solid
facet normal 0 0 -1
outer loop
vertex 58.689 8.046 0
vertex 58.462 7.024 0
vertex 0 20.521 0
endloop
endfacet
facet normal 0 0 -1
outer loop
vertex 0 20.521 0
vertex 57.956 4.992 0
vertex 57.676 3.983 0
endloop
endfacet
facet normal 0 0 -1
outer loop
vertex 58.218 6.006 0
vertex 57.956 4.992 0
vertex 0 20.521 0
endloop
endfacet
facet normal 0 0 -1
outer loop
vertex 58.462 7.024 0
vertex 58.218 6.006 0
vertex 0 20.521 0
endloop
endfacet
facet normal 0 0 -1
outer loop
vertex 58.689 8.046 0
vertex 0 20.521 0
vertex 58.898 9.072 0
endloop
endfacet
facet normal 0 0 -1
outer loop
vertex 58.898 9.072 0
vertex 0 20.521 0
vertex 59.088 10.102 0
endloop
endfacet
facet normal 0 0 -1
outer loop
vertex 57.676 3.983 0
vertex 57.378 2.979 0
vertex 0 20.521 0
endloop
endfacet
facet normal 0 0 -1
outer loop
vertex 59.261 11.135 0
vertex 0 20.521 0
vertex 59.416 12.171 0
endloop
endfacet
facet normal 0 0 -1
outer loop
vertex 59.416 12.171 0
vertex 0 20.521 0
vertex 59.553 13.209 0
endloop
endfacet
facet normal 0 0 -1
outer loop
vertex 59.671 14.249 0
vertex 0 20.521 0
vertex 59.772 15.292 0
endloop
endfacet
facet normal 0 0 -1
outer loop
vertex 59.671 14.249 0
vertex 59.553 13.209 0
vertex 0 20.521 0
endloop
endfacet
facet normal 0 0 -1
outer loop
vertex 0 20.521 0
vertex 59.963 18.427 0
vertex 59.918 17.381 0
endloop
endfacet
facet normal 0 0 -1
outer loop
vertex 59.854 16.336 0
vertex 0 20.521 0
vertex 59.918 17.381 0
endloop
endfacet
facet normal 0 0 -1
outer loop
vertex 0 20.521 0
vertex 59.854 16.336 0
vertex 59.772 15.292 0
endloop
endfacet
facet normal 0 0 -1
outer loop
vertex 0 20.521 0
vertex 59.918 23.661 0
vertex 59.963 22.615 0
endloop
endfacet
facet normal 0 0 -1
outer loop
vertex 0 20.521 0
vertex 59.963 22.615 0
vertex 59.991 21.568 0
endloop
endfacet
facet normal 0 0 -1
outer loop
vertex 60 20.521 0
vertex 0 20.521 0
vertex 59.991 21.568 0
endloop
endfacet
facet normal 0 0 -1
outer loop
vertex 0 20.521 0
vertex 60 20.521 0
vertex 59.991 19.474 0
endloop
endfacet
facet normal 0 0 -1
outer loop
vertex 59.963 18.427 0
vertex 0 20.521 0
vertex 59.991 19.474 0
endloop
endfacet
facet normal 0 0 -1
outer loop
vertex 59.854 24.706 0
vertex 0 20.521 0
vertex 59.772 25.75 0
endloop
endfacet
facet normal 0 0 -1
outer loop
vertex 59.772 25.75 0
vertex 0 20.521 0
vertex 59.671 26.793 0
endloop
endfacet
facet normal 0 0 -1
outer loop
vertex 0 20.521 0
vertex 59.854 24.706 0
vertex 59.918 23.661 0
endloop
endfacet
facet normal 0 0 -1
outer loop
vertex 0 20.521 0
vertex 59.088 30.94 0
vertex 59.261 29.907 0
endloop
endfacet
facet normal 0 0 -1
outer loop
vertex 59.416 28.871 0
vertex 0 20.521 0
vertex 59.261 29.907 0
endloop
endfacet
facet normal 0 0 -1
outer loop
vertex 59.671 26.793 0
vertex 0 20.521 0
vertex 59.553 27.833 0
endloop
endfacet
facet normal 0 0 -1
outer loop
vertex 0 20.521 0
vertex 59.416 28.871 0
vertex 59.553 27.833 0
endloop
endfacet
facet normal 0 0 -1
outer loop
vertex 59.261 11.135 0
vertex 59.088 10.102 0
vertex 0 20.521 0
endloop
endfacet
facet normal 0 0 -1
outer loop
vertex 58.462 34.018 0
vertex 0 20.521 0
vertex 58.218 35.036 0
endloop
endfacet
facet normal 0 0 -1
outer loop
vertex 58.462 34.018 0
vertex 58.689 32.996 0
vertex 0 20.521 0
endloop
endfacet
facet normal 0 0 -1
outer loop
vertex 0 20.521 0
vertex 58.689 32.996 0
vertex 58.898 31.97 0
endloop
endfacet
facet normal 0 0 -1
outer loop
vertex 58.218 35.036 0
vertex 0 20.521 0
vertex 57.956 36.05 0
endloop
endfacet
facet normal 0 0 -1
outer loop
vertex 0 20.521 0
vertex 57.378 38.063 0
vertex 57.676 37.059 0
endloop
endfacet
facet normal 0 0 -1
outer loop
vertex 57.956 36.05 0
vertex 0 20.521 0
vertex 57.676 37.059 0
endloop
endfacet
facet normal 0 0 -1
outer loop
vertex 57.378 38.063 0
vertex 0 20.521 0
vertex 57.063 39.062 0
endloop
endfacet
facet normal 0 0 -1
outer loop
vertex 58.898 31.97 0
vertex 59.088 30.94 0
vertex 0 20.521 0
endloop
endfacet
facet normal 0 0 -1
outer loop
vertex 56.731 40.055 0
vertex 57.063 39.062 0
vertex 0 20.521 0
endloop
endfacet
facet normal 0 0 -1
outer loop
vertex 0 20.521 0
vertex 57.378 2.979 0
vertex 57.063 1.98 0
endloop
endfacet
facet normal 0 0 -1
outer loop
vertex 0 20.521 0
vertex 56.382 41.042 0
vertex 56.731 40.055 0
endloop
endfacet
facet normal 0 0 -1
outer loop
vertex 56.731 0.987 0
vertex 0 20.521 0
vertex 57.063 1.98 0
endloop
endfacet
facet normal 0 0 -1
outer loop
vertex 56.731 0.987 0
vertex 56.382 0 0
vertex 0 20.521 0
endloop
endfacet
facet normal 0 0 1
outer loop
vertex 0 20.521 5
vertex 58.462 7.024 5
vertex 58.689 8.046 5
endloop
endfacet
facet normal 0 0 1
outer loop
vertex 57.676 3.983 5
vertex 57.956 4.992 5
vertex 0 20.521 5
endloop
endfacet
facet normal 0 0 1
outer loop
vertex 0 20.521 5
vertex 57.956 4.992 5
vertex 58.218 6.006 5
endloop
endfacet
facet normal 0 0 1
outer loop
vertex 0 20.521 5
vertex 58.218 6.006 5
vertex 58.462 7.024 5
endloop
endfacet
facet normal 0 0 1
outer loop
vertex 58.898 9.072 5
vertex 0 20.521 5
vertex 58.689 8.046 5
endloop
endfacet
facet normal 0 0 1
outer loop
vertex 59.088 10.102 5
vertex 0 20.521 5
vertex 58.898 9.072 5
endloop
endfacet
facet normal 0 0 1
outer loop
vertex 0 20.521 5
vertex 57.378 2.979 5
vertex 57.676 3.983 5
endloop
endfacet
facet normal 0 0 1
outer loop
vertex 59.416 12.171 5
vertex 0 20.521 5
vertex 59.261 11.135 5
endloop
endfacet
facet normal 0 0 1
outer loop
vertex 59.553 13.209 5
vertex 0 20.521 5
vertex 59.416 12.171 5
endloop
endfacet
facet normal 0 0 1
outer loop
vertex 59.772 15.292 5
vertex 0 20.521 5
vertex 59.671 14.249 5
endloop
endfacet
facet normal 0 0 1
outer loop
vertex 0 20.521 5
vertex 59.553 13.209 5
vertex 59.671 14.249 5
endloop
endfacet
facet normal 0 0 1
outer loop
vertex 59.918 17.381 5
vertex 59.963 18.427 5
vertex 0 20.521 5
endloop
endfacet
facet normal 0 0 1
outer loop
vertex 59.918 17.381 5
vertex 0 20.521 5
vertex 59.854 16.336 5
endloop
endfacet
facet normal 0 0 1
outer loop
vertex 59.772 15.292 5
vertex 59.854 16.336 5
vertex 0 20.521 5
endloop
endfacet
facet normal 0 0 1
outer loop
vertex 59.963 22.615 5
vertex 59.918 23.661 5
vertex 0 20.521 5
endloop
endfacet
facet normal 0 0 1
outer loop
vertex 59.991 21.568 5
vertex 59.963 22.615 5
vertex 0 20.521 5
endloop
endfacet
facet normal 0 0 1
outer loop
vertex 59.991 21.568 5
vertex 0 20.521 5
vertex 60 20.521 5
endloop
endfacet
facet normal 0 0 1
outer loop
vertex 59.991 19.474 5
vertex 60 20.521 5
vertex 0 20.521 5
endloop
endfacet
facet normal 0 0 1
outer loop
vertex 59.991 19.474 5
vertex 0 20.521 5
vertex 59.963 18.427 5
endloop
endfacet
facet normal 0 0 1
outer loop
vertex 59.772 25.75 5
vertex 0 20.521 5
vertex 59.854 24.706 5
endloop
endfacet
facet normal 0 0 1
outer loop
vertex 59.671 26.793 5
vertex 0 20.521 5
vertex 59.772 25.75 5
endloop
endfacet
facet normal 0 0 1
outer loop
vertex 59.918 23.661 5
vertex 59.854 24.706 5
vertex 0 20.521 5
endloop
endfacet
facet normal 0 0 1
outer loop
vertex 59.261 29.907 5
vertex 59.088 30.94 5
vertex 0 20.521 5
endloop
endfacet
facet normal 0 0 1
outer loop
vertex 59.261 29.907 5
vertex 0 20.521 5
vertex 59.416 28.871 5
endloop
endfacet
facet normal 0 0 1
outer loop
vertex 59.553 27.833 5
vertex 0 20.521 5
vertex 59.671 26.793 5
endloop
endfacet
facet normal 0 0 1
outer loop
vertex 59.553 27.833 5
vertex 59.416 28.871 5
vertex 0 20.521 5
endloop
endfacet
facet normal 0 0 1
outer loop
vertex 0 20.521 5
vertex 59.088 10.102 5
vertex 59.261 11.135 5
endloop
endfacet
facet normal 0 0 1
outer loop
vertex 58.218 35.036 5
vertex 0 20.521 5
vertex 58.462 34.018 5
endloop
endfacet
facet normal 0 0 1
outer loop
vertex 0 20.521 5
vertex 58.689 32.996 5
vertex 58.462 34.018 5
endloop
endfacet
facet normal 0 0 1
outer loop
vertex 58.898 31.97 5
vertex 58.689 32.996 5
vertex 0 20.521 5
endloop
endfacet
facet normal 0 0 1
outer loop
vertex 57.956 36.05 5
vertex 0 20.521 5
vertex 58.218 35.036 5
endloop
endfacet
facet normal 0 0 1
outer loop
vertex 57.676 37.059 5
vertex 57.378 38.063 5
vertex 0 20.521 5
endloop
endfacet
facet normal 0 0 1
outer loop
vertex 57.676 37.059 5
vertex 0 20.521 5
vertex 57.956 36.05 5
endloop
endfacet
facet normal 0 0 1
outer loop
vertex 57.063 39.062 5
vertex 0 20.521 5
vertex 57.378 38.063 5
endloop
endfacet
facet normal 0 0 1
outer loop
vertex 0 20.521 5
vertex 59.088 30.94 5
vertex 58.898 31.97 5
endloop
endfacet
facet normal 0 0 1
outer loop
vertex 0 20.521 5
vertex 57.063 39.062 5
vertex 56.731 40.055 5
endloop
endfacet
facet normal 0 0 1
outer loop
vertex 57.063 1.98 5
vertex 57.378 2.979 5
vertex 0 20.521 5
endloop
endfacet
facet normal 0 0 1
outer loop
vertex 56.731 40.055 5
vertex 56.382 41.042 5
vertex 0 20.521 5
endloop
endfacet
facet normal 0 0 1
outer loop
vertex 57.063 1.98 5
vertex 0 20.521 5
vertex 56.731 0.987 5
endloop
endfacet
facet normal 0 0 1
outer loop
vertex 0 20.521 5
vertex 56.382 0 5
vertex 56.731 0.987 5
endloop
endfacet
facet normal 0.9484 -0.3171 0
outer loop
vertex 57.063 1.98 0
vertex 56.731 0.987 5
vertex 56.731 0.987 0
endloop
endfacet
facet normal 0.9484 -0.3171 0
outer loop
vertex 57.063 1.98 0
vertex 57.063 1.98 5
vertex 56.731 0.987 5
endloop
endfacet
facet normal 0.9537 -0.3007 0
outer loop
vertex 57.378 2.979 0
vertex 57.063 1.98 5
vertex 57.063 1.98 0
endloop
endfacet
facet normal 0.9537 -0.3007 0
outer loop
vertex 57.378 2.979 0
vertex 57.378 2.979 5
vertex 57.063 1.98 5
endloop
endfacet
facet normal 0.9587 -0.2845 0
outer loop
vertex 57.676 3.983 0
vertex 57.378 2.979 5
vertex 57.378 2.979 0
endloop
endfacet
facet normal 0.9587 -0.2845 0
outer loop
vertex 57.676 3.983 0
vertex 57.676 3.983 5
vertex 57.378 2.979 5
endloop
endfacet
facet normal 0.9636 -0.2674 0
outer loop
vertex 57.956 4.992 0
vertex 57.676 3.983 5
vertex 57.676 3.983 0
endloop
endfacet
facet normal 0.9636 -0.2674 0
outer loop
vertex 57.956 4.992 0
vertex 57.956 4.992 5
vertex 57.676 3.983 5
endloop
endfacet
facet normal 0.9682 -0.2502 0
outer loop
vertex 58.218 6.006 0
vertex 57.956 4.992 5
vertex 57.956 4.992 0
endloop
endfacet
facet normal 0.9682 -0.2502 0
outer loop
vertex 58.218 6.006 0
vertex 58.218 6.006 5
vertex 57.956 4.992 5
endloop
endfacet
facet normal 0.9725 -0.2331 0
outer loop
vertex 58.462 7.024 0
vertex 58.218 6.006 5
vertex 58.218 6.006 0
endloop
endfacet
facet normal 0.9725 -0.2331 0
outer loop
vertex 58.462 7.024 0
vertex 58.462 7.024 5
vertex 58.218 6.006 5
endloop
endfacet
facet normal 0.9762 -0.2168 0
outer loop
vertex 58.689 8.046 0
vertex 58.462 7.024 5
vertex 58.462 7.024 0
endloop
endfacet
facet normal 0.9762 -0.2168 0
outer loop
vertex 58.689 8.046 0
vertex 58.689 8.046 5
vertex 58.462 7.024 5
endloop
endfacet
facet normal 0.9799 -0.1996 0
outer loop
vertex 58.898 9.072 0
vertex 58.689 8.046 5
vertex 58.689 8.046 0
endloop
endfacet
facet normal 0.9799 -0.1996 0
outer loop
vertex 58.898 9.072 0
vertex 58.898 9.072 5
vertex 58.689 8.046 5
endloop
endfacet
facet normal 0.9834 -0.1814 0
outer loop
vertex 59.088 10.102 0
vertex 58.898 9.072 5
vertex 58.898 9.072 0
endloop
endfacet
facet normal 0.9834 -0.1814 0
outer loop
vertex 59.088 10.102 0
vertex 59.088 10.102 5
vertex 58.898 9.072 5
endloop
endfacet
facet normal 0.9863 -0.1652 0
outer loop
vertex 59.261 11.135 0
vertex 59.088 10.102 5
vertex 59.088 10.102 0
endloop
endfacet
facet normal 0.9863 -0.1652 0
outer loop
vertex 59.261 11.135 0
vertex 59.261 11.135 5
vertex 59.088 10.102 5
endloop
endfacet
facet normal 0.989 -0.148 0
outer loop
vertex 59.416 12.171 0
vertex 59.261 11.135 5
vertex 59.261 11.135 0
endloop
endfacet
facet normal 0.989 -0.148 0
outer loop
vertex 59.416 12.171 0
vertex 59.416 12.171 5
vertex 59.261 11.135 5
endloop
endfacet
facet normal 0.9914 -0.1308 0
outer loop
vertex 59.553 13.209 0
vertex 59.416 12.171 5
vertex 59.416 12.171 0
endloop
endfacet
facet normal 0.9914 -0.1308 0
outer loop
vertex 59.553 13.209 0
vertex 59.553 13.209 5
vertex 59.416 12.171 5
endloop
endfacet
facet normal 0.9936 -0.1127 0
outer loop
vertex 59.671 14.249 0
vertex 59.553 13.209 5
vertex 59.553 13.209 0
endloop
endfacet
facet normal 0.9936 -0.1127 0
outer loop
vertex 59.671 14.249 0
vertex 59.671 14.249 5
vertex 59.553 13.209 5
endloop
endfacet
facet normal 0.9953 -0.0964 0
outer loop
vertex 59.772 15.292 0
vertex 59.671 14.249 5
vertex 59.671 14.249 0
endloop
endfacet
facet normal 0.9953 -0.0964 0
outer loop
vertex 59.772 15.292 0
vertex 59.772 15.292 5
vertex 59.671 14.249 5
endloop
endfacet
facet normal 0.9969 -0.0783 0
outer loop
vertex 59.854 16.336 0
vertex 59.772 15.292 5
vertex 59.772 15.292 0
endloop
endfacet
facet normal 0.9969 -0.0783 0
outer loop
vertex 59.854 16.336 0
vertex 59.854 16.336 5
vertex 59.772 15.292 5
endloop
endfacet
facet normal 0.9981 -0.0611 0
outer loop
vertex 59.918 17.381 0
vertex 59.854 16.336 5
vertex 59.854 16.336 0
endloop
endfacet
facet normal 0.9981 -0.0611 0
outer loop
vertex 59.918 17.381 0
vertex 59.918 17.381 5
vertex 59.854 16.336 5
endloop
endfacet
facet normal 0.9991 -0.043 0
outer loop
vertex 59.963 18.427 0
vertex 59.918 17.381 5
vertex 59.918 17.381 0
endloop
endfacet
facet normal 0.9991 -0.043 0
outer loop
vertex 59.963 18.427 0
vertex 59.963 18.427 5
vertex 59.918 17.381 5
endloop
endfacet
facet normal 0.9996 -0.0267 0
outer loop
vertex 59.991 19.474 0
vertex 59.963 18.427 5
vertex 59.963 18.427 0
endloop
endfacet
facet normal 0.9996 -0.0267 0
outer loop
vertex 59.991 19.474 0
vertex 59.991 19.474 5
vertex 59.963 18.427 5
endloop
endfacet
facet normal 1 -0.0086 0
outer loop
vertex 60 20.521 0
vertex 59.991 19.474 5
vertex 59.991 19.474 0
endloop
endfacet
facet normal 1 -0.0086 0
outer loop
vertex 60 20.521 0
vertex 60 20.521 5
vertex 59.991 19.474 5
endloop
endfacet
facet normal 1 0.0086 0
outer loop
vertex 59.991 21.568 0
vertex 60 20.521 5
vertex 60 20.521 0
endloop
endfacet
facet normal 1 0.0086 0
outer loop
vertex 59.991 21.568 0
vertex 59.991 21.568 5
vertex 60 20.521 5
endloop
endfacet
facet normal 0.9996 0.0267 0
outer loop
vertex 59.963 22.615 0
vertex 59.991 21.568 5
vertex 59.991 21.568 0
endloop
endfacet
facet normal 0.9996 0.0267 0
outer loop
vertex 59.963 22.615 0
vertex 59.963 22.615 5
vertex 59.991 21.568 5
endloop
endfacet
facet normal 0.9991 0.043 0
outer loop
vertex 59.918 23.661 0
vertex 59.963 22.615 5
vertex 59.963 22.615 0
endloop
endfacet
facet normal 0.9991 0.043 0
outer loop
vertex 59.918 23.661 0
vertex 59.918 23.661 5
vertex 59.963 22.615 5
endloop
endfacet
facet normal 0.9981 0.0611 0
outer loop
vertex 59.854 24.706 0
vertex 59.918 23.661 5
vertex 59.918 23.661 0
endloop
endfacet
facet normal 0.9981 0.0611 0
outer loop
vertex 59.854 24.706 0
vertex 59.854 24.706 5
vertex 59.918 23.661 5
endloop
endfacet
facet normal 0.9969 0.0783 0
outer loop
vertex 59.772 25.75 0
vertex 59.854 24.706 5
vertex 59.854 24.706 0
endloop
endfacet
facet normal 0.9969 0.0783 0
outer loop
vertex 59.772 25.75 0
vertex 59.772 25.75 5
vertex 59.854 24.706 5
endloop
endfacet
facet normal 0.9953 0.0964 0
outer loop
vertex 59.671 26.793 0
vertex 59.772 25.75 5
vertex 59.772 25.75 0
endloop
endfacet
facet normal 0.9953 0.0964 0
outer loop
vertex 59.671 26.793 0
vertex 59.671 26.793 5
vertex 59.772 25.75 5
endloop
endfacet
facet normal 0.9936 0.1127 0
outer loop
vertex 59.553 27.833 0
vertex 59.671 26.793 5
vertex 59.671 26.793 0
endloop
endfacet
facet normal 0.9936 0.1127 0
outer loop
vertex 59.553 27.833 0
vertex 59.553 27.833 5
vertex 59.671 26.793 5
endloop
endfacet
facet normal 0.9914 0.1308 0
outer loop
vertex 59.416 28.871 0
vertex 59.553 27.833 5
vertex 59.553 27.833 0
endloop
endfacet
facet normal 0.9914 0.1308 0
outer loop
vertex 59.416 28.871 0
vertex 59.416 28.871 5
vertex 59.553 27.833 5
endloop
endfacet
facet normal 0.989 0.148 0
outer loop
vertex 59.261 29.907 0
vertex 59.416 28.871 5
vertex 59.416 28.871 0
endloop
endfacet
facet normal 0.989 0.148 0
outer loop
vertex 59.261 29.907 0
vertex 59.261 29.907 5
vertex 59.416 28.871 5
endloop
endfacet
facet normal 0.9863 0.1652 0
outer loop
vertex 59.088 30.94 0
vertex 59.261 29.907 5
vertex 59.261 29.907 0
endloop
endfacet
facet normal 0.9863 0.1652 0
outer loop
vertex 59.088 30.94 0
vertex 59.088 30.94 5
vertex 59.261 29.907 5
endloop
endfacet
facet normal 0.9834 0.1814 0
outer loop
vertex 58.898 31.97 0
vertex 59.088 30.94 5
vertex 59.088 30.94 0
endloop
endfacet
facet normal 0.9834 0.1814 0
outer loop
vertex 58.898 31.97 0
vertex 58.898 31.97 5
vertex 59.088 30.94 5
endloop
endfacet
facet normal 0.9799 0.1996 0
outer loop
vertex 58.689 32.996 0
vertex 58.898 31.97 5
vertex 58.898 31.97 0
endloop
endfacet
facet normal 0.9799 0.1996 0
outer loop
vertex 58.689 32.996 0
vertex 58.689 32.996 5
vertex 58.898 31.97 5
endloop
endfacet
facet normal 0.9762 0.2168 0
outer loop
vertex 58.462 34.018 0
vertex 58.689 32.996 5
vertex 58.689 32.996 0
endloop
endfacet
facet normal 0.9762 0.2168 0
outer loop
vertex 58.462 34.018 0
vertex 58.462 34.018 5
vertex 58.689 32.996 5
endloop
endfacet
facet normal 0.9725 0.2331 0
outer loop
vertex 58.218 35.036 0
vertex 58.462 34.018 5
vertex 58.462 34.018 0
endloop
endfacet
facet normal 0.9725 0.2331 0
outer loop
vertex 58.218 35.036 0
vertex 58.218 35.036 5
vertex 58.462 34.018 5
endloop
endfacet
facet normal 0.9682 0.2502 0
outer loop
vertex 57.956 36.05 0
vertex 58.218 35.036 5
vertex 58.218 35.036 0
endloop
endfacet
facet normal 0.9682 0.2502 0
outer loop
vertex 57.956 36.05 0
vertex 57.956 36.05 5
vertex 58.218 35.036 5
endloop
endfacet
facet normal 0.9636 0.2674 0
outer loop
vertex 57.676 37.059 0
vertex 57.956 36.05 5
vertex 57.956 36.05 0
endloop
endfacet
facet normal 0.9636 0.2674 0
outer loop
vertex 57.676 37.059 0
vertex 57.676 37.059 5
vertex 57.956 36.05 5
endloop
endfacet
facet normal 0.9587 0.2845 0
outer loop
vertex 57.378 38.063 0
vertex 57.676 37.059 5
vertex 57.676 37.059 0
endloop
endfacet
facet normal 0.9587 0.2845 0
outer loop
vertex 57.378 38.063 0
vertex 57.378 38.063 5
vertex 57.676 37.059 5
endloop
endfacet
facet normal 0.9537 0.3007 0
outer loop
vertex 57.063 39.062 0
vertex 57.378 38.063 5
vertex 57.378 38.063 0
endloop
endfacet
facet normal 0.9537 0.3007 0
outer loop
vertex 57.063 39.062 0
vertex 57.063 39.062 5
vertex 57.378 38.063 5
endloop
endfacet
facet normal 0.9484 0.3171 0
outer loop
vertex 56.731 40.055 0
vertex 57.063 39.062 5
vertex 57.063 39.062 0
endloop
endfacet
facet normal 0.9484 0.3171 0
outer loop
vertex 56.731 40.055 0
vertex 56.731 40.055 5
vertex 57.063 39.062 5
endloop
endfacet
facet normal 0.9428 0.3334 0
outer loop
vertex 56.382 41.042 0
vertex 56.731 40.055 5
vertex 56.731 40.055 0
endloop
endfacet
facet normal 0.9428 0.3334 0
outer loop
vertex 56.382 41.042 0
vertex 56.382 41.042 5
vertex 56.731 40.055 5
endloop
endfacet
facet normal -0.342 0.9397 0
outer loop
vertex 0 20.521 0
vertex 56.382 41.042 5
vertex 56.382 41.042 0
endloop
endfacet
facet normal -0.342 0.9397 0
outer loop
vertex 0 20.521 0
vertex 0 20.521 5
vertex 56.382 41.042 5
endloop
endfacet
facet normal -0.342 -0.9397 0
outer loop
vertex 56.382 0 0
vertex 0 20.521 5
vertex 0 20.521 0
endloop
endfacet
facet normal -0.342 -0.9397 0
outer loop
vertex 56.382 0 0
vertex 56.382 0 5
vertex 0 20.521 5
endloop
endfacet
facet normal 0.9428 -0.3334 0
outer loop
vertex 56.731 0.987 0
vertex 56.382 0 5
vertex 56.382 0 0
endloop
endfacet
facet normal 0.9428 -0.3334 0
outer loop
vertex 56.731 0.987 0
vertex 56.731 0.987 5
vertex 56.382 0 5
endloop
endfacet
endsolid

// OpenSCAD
$fn = 32;

// ----------------------------------------------------------------------
// Arc profile plate: sector, 42 points
// ----------------------------------------------------------------------

// --- parameters (mm) ---
sector_angle = 40;        // sector angle, degrees
sector_r = 60;            // outer radius
arc_step = 1;             // sampling step of the arc, degrees
plate_t = 5;              // plate thickness, Z

bbox_x = 2 * sector_r * sin(sector_angle / 2);  // chord of the sector
bbox_y = sector_r;  // depth of the sector (apex to arc)

profile = [[56.382, 0], [56.731, 0.987], [57.063, 1.98], [57.378, 2.979], [57.676, 3.983], [57.956, 4.992], [58.218, 6.006], [58.462, 7.024], [58.689, 8.046], [58.898, 9.072], [59.088, 10.102], [59.261, 11.135], [59.416, 12.171], [59.553, 13.209], [59.671, 14.249], [59.772, 15.292], [59.854, 16.336], [59.918, 17.381], [59.963, 18.427], [59.991, 19.474], [60, 20.521], [59.991, 21.568], [59.963, 22.615], [59.918, 23.661], [59.854, 24.706], [59.772, 25.75], [59.671, 26.793], [59.553, 27.833], [59.416, 28.871], [59.261, 29.907], [59.088, 30.94], [58.898, 31.97], [58.689, 32.996], [58.462, 34.018], [58.218, 35.036], [57.956, 36.05], [57.676, 37.059], [57.378, 38.063], [57.063, 39.062], [56.731, 40.055], [56.382, 41.042], [0, 20.521]];  // primary outline, 42 points, counter clockwise

// --- the one profile operation ---
linear_extrude(height = plate_t) polygon(points = profile);
